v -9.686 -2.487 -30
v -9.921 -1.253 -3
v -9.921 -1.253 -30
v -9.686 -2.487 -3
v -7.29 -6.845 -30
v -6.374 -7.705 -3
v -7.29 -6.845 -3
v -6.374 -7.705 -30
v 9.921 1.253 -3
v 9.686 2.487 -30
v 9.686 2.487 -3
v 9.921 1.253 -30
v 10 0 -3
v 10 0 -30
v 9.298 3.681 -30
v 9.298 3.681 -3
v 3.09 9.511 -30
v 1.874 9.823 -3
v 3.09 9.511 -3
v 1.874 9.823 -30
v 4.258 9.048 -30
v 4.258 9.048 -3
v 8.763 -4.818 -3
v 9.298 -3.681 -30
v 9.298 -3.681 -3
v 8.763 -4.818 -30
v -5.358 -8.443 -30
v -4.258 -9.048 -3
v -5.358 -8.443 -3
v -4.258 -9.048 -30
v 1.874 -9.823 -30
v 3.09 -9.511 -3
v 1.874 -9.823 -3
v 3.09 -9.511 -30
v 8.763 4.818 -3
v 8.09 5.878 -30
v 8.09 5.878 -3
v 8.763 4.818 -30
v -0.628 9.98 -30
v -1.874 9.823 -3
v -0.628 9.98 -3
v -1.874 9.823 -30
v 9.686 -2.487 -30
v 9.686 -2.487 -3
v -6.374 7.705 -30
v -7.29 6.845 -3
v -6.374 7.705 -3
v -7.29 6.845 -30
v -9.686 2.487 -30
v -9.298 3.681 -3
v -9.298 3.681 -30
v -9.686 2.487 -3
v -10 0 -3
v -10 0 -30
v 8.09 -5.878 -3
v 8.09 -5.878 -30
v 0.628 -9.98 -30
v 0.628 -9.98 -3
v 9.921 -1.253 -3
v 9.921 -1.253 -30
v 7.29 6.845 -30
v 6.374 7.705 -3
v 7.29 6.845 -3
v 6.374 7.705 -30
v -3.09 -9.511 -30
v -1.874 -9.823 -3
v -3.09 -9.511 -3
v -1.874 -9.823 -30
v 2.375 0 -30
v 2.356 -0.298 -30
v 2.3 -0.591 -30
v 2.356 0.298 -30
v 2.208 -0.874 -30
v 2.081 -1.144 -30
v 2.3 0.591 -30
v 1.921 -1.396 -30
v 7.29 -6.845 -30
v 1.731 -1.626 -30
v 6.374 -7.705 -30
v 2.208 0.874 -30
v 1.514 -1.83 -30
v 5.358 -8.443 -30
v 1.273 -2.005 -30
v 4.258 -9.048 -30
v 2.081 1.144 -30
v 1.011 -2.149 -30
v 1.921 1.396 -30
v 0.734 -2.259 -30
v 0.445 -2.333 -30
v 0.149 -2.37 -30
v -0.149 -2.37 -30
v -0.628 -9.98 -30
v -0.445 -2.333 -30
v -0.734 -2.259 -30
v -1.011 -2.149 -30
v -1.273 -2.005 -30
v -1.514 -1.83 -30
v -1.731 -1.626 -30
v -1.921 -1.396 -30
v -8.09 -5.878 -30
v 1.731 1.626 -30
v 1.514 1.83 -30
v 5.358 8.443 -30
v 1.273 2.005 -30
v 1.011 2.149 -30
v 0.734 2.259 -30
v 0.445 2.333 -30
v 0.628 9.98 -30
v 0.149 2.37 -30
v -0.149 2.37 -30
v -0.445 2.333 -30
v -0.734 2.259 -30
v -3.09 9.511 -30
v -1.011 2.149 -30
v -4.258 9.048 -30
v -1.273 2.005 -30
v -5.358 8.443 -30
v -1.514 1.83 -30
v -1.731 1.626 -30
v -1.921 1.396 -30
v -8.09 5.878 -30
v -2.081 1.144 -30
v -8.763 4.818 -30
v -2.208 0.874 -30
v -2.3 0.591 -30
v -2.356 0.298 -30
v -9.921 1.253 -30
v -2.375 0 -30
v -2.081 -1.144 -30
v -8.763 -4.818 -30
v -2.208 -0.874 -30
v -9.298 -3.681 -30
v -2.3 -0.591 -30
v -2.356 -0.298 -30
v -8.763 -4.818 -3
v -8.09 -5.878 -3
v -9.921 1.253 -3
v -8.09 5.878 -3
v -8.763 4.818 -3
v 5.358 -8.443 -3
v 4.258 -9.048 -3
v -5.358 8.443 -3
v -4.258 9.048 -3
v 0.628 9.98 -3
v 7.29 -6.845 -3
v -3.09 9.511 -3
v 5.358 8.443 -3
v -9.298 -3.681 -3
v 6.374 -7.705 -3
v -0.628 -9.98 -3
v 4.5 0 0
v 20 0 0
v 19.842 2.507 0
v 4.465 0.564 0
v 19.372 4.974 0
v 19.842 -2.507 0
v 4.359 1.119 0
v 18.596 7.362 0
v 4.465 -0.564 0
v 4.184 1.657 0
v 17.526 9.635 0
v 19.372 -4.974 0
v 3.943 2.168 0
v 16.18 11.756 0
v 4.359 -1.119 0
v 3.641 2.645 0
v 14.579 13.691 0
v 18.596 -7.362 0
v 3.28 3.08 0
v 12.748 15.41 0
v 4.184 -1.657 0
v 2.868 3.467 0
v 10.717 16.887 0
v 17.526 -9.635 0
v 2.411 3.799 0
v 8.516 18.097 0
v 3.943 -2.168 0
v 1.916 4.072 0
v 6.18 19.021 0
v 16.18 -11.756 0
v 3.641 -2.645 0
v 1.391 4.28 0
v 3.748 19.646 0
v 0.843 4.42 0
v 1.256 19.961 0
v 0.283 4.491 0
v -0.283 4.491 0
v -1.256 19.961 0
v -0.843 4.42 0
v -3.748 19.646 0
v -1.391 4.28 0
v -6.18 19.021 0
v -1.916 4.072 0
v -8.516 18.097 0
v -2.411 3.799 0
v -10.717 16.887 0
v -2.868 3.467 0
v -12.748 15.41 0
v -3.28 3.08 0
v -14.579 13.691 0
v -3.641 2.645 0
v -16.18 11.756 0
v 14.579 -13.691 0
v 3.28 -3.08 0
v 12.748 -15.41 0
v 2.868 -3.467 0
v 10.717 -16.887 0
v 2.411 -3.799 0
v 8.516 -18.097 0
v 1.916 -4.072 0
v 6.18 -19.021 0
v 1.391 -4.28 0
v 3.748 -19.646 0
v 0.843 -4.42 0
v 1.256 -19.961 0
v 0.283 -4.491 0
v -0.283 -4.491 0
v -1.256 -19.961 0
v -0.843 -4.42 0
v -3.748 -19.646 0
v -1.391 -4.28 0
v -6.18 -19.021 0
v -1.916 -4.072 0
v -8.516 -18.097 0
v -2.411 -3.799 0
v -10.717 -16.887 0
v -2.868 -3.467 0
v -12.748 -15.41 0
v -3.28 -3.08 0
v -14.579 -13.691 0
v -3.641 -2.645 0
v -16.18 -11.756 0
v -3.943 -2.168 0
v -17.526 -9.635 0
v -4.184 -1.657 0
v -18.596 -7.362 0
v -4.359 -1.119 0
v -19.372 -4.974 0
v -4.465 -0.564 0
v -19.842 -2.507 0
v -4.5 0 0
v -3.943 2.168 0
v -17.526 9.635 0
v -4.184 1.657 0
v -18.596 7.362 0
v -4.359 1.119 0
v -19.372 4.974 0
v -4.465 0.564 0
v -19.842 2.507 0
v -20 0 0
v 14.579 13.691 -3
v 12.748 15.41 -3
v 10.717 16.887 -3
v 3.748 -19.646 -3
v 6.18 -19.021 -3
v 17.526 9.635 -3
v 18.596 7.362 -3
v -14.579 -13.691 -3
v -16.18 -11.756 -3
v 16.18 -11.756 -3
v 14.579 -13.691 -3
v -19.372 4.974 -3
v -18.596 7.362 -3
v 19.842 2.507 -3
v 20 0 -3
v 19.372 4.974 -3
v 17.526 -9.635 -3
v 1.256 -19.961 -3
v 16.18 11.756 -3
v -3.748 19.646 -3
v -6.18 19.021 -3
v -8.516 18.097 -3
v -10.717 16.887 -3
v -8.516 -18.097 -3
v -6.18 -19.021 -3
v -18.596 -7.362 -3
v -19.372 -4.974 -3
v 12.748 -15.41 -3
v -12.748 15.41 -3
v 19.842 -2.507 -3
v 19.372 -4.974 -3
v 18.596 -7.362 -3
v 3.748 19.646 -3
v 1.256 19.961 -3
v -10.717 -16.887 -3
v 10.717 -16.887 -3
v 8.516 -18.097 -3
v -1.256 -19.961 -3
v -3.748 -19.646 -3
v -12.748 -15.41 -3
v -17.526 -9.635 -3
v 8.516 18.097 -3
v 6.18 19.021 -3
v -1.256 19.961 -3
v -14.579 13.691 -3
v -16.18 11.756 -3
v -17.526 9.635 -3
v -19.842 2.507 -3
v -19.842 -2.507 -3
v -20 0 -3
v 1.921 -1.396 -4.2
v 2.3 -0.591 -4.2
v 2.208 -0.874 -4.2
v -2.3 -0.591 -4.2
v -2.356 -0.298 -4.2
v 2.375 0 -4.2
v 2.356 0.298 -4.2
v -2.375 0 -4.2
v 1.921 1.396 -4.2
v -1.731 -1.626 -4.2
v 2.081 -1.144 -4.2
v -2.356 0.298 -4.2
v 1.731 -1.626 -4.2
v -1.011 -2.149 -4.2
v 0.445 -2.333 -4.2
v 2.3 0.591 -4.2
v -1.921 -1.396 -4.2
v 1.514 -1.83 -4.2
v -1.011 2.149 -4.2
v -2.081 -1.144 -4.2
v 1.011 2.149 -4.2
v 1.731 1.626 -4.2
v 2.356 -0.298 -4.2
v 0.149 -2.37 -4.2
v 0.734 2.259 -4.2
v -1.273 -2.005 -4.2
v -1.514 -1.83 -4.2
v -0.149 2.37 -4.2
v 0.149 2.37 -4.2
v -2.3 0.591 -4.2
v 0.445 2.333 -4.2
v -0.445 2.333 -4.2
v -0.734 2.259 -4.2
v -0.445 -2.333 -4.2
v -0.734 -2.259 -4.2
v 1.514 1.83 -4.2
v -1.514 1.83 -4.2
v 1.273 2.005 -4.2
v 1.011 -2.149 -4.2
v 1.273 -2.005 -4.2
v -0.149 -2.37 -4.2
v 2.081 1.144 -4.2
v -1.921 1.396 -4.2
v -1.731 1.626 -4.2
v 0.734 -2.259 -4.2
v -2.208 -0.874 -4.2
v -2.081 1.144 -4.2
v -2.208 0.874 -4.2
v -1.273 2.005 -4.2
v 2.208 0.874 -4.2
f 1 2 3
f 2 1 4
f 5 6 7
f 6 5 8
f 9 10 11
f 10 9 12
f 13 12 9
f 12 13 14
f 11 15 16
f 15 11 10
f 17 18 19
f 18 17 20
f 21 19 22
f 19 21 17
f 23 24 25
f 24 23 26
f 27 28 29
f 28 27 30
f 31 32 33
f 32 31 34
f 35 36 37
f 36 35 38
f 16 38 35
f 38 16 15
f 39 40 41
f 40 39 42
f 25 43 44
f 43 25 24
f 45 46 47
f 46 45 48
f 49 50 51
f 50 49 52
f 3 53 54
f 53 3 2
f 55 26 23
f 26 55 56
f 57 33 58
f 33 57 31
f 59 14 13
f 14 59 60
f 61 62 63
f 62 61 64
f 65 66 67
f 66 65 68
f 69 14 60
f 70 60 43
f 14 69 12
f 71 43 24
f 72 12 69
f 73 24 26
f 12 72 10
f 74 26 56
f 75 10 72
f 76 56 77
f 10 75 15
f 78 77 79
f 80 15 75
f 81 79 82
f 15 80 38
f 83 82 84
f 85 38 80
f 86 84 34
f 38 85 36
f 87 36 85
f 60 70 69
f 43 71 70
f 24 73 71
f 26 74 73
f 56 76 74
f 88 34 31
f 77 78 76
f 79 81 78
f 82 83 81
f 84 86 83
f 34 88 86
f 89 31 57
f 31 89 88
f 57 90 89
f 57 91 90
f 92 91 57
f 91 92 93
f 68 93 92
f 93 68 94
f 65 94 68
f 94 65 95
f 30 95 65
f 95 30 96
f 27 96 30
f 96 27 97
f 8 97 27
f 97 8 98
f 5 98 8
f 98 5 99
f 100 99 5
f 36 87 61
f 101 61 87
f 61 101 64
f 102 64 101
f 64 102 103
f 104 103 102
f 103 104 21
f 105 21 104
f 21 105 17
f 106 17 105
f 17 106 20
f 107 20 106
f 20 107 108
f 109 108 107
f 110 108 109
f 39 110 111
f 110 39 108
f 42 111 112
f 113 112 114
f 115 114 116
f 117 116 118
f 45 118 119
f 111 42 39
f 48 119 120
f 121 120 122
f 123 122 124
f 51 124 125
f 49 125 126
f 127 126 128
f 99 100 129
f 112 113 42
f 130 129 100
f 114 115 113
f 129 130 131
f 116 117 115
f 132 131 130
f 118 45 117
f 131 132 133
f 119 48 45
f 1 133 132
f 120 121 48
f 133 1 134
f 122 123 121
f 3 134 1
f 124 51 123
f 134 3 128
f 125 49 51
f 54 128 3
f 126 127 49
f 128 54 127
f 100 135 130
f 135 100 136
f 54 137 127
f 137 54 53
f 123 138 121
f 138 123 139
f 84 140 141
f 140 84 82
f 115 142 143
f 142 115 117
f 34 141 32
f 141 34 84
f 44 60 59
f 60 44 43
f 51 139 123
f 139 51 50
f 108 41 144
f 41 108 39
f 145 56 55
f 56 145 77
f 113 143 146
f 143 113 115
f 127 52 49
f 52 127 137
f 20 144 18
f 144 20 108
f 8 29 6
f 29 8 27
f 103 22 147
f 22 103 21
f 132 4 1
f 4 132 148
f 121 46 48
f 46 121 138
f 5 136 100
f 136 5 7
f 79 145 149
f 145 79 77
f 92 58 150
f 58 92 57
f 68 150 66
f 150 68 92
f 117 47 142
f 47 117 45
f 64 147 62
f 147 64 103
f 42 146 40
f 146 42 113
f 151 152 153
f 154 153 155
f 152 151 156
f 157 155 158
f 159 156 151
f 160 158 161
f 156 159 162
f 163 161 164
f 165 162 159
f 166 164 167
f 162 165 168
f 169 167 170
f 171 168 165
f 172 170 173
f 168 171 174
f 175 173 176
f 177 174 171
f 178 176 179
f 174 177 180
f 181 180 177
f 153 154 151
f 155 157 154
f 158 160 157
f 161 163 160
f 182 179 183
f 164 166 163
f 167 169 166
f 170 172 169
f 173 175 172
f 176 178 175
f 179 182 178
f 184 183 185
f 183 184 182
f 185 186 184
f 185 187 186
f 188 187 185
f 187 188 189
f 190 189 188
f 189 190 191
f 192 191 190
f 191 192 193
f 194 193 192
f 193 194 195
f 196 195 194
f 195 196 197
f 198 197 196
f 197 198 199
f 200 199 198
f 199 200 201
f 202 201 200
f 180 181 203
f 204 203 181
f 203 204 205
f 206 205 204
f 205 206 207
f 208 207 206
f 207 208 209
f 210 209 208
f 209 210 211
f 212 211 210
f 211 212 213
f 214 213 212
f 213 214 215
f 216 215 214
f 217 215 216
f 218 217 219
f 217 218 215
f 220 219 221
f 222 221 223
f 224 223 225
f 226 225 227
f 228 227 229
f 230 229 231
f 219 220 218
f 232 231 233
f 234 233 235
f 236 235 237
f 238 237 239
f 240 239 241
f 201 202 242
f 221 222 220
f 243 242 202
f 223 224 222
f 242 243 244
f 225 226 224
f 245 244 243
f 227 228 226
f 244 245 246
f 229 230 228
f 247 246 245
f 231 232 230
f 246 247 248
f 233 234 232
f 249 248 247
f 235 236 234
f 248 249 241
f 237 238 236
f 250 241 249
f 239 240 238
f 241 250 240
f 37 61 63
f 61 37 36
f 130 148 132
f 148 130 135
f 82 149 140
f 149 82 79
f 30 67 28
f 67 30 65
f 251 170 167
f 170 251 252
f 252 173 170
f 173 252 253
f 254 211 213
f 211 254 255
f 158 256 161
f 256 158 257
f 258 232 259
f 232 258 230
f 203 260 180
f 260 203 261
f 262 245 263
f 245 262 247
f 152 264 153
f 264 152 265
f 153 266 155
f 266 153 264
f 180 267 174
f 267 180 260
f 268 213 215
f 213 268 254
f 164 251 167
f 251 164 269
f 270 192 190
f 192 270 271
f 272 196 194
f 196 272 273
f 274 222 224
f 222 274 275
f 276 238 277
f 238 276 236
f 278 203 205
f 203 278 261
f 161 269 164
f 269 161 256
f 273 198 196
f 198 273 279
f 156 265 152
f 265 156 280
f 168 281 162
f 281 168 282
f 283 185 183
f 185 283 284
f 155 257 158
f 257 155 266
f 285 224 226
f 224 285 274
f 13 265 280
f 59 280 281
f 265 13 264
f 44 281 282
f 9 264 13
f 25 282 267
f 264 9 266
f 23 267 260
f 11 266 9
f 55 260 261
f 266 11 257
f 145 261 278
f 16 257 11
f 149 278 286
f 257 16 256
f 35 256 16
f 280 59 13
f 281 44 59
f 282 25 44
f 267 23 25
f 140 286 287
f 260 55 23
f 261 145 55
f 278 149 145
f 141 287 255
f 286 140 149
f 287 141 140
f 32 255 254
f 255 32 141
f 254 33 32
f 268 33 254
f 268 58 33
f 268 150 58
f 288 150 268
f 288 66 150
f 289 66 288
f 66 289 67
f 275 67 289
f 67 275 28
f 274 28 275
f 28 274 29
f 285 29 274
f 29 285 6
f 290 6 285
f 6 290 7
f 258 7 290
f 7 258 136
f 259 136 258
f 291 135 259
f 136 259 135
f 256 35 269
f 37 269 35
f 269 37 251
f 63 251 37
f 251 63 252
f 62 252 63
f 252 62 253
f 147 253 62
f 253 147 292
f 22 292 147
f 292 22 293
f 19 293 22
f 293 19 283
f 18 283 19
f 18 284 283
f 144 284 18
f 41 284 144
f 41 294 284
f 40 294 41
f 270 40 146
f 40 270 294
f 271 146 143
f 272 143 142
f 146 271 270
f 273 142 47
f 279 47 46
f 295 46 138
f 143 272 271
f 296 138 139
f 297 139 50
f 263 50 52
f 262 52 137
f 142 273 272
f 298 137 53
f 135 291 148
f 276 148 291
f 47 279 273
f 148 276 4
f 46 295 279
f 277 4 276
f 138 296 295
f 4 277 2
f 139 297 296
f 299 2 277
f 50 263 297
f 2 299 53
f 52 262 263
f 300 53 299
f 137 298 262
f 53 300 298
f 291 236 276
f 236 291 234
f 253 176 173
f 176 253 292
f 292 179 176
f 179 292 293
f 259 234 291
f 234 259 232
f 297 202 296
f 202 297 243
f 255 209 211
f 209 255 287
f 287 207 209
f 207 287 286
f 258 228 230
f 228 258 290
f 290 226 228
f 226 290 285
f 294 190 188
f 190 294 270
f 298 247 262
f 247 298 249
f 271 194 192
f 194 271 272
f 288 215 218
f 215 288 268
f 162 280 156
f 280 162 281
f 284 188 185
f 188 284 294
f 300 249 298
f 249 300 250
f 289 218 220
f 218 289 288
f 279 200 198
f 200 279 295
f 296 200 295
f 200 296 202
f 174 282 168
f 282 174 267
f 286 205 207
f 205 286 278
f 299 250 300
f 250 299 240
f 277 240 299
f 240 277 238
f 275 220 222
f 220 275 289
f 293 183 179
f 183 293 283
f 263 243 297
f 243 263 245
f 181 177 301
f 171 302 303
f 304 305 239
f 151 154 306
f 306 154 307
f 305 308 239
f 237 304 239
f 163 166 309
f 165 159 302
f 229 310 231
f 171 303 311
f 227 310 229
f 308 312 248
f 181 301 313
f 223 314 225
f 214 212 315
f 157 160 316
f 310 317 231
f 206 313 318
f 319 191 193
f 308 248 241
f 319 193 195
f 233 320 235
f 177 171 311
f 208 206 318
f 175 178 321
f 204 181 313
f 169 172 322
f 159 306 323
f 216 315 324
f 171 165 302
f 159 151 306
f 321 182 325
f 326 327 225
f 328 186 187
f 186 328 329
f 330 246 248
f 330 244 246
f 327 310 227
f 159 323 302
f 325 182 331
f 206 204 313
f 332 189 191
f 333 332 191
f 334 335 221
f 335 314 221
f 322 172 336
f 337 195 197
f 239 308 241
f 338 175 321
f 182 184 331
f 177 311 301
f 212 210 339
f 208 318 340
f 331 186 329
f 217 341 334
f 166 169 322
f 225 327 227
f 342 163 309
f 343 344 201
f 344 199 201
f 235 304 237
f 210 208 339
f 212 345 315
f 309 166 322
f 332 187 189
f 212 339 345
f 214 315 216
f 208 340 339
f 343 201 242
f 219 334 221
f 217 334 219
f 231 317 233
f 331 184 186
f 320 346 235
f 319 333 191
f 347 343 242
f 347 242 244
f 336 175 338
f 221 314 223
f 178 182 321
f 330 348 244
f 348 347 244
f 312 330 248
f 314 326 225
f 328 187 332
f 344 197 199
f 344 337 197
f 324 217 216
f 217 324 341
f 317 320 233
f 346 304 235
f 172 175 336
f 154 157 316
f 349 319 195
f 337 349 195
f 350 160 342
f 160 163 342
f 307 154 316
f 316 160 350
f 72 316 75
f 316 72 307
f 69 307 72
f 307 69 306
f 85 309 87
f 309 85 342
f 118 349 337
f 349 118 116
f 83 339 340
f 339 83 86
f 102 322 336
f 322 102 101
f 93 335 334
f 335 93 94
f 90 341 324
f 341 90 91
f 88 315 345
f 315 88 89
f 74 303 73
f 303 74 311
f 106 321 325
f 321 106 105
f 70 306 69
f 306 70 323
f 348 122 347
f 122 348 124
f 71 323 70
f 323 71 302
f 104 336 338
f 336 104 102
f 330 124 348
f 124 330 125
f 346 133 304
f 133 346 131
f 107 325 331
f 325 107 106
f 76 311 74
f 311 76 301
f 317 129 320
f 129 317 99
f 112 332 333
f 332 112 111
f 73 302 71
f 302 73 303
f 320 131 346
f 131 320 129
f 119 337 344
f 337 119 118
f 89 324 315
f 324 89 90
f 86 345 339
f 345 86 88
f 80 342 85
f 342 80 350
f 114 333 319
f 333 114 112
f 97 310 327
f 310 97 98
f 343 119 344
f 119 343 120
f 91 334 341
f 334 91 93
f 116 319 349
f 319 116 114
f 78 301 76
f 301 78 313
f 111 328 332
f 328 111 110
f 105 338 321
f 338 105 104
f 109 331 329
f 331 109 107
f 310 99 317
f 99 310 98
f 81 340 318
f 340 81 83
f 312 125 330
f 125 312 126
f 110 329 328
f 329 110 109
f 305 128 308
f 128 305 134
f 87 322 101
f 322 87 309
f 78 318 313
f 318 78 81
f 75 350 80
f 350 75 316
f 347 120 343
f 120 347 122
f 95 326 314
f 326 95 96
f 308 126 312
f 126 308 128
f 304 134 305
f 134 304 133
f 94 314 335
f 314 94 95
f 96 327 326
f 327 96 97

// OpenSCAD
$fn = 50;


difference() {
	union() {
		translate(v = [0, 0, -30.0000000000]) {
			cylinder(h = 30, r = 10.0000000000);
		}
		translate(v = [0, 0, -3.0000000000]) {
			cylinder(h = 3, r = 20.0000000000);
		}
	}
	union() {
		translate(v = [0, 0, 0]) {
			rotate(a = [0, 0, 0]) {
				difference() {
					union() {
						#translate(v = [0, 0, -30.0000000000]) {
							cylinder(h = 30, r = 2.2500000000);
						}
						#translate(v = [0, 0, -4.2000000000]) {
							cylinder(h = 4.2000000000, r = 10.0000000000, r1 = 2.3750000000, r2 = 4.5000000000);
						}
						#translate(v = [0, 0, -30.0000000000]) {
							cylinder(h = 30, r = 2.3750000000);
						}
						#translate(v = [0, 0, -30.0000000000]) {
							cylinder(h = 30, r = 2.2500000000);
						}
					}
					union();
				}
			}
		}
	}
}
